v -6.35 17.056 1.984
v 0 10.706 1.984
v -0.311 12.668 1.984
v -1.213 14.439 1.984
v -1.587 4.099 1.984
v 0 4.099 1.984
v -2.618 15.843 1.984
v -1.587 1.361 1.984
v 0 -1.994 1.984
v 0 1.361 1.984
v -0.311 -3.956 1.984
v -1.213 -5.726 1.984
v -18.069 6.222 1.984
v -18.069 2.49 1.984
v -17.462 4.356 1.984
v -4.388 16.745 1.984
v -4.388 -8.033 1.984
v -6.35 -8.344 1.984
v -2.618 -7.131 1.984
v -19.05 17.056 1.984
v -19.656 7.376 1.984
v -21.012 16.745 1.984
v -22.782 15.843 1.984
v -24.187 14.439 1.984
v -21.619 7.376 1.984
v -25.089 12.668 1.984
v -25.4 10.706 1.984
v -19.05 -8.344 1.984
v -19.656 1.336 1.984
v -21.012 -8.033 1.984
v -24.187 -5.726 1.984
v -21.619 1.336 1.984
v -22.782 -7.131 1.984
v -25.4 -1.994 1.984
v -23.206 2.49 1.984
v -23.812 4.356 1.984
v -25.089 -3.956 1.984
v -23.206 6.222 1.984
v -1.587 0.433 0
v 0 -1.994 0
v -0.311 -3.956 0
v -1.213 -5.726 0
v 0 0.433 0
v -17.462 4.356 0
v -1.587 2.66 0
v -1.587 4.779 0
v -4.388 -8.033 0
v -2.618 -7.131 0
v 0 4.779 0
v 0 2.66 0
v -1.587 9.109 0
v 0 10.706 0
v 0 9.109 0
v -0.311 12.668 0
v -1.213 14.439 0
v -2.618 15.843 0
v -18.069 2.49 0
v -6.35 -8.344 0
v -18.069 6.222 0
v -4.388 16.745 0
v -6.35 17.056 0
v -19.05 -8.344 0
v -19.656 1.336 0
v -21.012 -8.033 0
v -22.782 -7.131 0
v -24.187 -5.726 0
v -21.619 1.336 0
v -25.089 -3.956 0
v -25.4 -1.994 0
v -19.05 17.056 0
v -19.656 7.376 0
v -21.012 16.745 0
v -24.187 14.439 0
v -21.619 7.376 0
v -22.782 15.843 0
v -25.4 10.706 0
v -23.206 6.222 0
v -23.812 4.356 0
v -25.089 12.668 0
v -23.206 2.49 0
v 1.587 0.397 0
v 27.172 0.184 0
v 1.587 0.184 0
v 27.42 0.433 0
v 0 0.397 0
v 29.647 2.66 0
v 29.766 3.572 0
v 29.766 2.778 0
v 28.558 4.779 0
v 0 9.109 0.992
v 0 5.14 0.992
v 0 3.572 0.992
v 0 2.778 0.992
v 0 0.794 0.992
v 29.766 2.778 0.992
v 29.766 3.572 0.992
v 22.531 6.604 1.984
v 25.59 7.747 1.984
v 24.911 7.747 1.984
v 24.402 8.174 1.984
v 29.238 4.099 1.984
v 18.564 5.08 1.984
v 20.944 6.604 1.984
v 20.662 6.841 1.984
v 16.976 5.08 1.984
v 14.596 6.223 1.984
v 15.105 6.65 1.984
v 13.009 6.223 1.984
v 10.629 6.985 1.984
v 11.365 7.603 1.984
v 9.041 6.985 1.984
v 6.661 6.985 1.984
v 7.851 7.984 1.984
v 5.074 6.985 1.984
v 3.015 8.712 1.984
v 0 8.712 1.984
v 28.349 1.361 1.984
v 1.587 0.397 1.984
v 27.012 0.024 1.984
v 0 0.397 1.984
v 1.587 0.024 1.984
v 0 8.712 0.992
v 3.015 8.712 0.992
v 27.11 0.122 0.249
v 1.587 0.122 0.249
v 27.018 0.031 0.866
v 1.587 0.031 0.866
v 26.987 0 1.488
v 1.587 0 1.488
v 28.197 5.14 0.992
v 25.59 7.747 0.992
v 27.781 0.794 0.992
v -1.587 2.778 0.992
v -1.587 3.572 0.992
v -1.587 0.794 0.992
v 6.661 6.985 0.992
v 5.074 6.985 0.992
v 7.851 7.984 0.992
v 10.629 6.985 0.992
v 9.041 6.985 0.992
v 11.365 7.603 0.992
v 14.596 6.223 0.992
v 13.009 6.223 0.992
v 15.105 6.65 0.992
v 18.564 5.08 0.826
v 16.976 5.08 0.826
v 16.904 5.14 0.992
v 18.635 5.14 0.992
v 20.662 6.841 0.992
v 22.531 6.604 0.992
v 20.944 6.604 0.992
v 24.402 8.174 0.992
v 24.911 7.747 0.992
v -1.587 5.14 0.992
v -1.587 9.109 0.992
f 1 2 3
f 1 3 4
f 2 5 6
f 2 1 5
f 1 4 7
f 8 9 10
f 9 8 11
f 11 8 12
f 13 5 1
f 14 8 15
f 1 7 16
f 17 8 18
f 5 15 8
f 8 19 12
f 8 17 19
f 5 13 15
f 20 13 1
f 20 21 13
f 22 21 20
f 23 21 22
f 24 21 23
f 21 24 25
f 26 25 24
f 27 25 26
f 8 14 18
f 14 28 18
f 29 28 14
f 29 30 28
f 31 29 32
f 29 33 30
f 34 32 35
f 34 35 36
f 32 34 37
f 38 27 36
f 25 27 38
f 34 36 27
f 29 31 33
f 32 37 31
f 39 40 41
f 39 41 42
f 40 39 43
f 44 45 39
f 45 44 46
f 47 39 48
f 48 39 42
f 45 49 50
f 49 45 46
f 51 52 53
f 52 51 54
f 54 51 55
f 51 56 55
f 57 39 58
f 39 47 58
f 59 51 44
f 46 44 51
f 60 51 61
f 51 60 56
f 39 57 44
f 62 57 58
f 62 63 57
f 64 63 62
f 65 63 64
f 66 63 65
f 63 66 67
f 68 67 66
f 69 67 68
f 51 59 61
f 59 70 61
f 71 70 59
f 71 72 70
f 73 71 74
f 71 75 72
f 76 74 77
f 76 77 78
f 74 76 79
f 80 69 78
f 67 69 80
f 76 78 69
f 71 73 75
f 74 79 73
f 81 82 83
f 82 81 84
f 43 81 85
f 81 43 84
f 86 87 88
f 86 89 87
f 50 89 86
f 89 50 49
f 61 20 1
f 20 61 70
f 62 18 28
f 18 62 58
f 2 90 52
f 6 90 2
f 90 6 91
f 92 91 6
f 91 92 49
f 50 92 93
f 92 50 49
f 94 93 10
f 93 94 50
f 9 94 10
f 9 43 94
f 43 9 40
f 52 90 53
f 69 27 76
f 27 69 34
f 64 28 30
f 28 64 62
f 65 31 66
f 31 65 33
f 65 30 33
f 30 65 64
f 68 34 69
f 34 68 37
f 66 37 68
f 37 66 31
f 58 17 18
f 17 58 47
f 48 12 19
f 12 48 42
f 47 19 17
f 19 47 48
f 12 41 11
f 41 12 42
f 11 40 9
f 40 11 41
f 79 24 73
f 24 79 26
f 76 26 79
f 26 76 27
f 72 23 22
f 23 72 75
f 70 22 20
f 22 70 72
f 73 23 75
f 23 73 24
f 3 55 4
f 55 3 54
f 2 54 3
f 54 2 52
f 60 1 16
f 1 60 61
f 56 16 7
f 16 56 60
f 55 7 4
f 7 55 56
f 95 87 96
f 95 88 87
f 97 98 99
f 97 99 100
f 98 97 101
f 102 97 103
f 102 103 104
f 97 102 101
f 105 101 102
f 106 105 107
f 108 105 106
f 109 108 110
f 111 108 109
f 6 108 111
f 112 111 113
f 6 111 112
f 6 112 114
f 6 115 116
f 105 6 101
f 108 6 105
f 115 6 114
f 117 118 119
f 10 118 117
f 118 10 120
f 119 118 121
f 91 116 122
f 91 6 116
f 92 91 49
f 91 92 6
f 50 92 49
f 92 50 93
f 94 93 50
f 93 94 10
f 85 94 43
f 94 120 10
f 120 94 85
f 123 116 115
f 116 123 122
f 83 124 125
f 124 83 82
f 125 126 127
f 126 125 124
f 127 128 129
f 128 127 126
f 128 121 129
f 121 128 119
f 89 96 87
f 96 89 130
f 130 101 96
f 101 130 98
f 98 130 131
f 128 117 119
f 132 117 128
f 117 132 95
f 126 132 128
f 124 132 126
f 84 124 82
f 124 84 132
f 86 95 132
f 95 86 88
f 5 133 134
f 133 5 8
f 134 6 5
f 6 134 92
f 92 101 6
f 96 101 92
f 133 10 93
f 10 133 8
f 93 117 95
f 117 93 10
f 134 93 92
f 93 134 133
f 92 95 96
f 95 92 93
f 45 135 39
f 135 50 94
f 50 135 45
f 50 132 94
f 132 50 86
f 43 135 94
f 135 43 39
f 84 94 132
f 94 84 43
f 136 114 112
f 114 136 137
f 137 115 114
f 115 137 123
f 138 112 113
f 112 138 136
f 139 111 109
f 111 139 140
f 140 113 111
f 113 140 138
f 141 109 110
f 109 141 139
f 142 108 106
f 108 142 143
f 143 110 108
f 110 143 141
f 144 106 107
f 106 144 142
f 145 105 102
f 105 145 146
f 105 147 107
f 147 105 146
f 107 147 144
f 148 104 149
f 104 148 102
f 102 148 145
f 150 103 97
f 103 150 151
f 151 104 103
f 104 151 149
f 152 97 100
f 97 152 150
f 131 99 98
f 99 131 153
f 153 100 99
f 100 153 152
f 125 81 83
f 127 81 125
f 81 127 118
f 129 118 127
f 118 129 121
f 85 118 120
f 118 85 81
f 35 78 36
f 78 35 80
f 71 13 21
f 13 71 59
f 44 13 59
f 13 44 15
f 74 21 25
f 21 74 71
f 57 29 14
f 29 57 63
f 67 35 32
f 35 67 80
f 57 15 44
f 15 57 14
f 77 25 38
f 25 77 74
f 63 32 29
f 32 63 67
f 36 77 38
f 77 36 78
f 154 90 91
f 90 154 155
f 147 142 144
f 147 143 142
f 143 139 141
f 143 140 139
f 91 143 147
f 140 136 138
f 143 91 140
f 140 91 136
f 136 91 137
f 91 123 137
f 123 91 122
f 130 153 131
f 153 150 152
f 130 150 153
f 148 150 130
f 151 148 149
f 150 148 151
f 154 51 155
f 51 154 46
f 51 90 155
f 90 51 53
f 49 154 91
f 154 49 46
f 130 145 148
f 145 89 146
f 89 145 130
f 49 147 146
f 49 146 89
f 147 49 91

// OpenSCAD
// Schlage SC4 Key Template - by Kevin Li <https://github.com/KevinLi>
// This work is a derivative of sc1.scad from "Physical Keygen" by Nirav Patel
// This work is licensed under a Creative Commons Attribution 3.0 Unported License.


// Physical Keygen - by Nirav Patel <http://eclecti.cc>
//
// Generate a duplicate of a Schlage SC4 key by editing the last line of the file
// and entering in the key code of the lock.  If you don't know the key code,
// you can measure the key and compare the numbers at:
// http://web.archive.org/web/20050217020917fw_/http://dlaco.com/spacing/tips.htm
//
// This work is licensed under a Creative Commons Attribution 3.0 Unported License.

// Since the keys and locks I have were all designed in imperial units, the
// constants in this file will be defined in inches.  The mm function
// allows us to retain the proper size for exporting a metric STL.
function mm(i) = i*25.4;

module rounded(size, r) {
	union() {
		translate([r, 0, 0]) cube([size[0]-2*r, size[1], size[2]]);
		translate([0, r, 0]) cube([size[0], size[1]-2*r, size[2]]);
		translate([r, r, 0]) cylinder(h=size[2], r=r);
		translate([size[0]-r, r, 0]) cylinder(h=size[2], r=r);
		translate([r, size[1]-r, 0]) cylinder(h=size[2], r=r);
		translate([size[0]-r, size[1]-r, 0]) cylinder(h=size[2], r=r);
	}
}

module bit() {
	w = mm(1/4);
	difference() {
		translate([-w/2, 0, 0]) cube([w, w, w]);
		translate([-mm(8/256), 0, 0]) rotate([0, 0, 140]) cube([w, w, w]);
		translate([ mm(8/256), 0, 0]) rotate([0, 0, -50]) cube([w, w, w]);
	}
}

// Schlage SC4 6 pin key.
// The measurements are from publicly available information.
module sc4(bits) {
	thickness = mm(5/64);
	length = mm(19/16);
	width = mm(0.343);

	shoulder = mm(0.231);
	pin_spacing = mm(0.1562);
	depth_inc = mm(0.015);

	// Less fudge, more difference between key width and depth 0
	fudge = mm(0.008);

	// Handle size
	h_l = mm(1);
	h_w = mm(1);
	h_d = mm(1/16);
	difference() {
		// blade and key handle
		union() {
			translate([-h_l, -h_w/2 + width/2, 0]) rounded([h_l, h_w, thickness], mm(1/4));
			intersection() {
				// cut a little off the tip to avoid going too long
				cube([length - mm(1/64), width, thickness]);
				translate([0, mm(1/4), thickness*3/4]) rotate([0, 90, 0]) cylinder(h=length, r=mm(1/4), $fn=64);
			}
		}

		// chamfer the tip
		translate([length, mm(1/8), 0]) {
			rotate([0, 0, 45]) cube([10, 10, thickness]);
			rotate([0, 0, 225]) cube([10, 10, thickness]);
		}

		// Bottom cut
		cube([mm(1/16), mm(1/64), thickness]);

		// put in a hole for keychain use
		translate([-h_l + mm(3/16), width/2, 0]) cylinder(h=thickness, r=mm(1/8));

		// cut the channels in the key.  designed more for printability than accuracy
		union() {
			translate([-h_d, mm(9/64), thickness/2]) rotate([62, 0, 0]) cube([length + h_d, width, width]);
			translate([-h_d, mm(7/64), thickness/2]) rotate([55, 0, 0]) cube([length + h_d, width, width]);
			translate([-h_d, mm(7/64), thickness/2]) cube([length + h_d, mm(1/32), width]);
		}

		translate([-h_d, width - mm(9/64), 0]) cube([length + h_d, width - (width - mm(10/64)), thickness/2]);
		translate([-h_d, width - mm(9/64), thickness/2]) rotate([-110, 0, 0]) cube([length + h_d, width, thickness/2]);

		intersection() {
			translate([-h_d, mm(1/32), thickness/2]) rotate([-118, 0, 0]) cube([length + h_d, width, width]);
			translate([-h_d, mm(1/32), thickness/2]) rotate([-110, 0, 0]) cube([length + h_d, width, width]);
		}

		// Do the actual bitting
		for (b = [0:5]) {
			translate([shoulder + b*pin_spacing, width - bits[b]*depth_inc - fudge, 0]) bit();
		}
	}
}

sc4([4,4,6,9,5,2]);
